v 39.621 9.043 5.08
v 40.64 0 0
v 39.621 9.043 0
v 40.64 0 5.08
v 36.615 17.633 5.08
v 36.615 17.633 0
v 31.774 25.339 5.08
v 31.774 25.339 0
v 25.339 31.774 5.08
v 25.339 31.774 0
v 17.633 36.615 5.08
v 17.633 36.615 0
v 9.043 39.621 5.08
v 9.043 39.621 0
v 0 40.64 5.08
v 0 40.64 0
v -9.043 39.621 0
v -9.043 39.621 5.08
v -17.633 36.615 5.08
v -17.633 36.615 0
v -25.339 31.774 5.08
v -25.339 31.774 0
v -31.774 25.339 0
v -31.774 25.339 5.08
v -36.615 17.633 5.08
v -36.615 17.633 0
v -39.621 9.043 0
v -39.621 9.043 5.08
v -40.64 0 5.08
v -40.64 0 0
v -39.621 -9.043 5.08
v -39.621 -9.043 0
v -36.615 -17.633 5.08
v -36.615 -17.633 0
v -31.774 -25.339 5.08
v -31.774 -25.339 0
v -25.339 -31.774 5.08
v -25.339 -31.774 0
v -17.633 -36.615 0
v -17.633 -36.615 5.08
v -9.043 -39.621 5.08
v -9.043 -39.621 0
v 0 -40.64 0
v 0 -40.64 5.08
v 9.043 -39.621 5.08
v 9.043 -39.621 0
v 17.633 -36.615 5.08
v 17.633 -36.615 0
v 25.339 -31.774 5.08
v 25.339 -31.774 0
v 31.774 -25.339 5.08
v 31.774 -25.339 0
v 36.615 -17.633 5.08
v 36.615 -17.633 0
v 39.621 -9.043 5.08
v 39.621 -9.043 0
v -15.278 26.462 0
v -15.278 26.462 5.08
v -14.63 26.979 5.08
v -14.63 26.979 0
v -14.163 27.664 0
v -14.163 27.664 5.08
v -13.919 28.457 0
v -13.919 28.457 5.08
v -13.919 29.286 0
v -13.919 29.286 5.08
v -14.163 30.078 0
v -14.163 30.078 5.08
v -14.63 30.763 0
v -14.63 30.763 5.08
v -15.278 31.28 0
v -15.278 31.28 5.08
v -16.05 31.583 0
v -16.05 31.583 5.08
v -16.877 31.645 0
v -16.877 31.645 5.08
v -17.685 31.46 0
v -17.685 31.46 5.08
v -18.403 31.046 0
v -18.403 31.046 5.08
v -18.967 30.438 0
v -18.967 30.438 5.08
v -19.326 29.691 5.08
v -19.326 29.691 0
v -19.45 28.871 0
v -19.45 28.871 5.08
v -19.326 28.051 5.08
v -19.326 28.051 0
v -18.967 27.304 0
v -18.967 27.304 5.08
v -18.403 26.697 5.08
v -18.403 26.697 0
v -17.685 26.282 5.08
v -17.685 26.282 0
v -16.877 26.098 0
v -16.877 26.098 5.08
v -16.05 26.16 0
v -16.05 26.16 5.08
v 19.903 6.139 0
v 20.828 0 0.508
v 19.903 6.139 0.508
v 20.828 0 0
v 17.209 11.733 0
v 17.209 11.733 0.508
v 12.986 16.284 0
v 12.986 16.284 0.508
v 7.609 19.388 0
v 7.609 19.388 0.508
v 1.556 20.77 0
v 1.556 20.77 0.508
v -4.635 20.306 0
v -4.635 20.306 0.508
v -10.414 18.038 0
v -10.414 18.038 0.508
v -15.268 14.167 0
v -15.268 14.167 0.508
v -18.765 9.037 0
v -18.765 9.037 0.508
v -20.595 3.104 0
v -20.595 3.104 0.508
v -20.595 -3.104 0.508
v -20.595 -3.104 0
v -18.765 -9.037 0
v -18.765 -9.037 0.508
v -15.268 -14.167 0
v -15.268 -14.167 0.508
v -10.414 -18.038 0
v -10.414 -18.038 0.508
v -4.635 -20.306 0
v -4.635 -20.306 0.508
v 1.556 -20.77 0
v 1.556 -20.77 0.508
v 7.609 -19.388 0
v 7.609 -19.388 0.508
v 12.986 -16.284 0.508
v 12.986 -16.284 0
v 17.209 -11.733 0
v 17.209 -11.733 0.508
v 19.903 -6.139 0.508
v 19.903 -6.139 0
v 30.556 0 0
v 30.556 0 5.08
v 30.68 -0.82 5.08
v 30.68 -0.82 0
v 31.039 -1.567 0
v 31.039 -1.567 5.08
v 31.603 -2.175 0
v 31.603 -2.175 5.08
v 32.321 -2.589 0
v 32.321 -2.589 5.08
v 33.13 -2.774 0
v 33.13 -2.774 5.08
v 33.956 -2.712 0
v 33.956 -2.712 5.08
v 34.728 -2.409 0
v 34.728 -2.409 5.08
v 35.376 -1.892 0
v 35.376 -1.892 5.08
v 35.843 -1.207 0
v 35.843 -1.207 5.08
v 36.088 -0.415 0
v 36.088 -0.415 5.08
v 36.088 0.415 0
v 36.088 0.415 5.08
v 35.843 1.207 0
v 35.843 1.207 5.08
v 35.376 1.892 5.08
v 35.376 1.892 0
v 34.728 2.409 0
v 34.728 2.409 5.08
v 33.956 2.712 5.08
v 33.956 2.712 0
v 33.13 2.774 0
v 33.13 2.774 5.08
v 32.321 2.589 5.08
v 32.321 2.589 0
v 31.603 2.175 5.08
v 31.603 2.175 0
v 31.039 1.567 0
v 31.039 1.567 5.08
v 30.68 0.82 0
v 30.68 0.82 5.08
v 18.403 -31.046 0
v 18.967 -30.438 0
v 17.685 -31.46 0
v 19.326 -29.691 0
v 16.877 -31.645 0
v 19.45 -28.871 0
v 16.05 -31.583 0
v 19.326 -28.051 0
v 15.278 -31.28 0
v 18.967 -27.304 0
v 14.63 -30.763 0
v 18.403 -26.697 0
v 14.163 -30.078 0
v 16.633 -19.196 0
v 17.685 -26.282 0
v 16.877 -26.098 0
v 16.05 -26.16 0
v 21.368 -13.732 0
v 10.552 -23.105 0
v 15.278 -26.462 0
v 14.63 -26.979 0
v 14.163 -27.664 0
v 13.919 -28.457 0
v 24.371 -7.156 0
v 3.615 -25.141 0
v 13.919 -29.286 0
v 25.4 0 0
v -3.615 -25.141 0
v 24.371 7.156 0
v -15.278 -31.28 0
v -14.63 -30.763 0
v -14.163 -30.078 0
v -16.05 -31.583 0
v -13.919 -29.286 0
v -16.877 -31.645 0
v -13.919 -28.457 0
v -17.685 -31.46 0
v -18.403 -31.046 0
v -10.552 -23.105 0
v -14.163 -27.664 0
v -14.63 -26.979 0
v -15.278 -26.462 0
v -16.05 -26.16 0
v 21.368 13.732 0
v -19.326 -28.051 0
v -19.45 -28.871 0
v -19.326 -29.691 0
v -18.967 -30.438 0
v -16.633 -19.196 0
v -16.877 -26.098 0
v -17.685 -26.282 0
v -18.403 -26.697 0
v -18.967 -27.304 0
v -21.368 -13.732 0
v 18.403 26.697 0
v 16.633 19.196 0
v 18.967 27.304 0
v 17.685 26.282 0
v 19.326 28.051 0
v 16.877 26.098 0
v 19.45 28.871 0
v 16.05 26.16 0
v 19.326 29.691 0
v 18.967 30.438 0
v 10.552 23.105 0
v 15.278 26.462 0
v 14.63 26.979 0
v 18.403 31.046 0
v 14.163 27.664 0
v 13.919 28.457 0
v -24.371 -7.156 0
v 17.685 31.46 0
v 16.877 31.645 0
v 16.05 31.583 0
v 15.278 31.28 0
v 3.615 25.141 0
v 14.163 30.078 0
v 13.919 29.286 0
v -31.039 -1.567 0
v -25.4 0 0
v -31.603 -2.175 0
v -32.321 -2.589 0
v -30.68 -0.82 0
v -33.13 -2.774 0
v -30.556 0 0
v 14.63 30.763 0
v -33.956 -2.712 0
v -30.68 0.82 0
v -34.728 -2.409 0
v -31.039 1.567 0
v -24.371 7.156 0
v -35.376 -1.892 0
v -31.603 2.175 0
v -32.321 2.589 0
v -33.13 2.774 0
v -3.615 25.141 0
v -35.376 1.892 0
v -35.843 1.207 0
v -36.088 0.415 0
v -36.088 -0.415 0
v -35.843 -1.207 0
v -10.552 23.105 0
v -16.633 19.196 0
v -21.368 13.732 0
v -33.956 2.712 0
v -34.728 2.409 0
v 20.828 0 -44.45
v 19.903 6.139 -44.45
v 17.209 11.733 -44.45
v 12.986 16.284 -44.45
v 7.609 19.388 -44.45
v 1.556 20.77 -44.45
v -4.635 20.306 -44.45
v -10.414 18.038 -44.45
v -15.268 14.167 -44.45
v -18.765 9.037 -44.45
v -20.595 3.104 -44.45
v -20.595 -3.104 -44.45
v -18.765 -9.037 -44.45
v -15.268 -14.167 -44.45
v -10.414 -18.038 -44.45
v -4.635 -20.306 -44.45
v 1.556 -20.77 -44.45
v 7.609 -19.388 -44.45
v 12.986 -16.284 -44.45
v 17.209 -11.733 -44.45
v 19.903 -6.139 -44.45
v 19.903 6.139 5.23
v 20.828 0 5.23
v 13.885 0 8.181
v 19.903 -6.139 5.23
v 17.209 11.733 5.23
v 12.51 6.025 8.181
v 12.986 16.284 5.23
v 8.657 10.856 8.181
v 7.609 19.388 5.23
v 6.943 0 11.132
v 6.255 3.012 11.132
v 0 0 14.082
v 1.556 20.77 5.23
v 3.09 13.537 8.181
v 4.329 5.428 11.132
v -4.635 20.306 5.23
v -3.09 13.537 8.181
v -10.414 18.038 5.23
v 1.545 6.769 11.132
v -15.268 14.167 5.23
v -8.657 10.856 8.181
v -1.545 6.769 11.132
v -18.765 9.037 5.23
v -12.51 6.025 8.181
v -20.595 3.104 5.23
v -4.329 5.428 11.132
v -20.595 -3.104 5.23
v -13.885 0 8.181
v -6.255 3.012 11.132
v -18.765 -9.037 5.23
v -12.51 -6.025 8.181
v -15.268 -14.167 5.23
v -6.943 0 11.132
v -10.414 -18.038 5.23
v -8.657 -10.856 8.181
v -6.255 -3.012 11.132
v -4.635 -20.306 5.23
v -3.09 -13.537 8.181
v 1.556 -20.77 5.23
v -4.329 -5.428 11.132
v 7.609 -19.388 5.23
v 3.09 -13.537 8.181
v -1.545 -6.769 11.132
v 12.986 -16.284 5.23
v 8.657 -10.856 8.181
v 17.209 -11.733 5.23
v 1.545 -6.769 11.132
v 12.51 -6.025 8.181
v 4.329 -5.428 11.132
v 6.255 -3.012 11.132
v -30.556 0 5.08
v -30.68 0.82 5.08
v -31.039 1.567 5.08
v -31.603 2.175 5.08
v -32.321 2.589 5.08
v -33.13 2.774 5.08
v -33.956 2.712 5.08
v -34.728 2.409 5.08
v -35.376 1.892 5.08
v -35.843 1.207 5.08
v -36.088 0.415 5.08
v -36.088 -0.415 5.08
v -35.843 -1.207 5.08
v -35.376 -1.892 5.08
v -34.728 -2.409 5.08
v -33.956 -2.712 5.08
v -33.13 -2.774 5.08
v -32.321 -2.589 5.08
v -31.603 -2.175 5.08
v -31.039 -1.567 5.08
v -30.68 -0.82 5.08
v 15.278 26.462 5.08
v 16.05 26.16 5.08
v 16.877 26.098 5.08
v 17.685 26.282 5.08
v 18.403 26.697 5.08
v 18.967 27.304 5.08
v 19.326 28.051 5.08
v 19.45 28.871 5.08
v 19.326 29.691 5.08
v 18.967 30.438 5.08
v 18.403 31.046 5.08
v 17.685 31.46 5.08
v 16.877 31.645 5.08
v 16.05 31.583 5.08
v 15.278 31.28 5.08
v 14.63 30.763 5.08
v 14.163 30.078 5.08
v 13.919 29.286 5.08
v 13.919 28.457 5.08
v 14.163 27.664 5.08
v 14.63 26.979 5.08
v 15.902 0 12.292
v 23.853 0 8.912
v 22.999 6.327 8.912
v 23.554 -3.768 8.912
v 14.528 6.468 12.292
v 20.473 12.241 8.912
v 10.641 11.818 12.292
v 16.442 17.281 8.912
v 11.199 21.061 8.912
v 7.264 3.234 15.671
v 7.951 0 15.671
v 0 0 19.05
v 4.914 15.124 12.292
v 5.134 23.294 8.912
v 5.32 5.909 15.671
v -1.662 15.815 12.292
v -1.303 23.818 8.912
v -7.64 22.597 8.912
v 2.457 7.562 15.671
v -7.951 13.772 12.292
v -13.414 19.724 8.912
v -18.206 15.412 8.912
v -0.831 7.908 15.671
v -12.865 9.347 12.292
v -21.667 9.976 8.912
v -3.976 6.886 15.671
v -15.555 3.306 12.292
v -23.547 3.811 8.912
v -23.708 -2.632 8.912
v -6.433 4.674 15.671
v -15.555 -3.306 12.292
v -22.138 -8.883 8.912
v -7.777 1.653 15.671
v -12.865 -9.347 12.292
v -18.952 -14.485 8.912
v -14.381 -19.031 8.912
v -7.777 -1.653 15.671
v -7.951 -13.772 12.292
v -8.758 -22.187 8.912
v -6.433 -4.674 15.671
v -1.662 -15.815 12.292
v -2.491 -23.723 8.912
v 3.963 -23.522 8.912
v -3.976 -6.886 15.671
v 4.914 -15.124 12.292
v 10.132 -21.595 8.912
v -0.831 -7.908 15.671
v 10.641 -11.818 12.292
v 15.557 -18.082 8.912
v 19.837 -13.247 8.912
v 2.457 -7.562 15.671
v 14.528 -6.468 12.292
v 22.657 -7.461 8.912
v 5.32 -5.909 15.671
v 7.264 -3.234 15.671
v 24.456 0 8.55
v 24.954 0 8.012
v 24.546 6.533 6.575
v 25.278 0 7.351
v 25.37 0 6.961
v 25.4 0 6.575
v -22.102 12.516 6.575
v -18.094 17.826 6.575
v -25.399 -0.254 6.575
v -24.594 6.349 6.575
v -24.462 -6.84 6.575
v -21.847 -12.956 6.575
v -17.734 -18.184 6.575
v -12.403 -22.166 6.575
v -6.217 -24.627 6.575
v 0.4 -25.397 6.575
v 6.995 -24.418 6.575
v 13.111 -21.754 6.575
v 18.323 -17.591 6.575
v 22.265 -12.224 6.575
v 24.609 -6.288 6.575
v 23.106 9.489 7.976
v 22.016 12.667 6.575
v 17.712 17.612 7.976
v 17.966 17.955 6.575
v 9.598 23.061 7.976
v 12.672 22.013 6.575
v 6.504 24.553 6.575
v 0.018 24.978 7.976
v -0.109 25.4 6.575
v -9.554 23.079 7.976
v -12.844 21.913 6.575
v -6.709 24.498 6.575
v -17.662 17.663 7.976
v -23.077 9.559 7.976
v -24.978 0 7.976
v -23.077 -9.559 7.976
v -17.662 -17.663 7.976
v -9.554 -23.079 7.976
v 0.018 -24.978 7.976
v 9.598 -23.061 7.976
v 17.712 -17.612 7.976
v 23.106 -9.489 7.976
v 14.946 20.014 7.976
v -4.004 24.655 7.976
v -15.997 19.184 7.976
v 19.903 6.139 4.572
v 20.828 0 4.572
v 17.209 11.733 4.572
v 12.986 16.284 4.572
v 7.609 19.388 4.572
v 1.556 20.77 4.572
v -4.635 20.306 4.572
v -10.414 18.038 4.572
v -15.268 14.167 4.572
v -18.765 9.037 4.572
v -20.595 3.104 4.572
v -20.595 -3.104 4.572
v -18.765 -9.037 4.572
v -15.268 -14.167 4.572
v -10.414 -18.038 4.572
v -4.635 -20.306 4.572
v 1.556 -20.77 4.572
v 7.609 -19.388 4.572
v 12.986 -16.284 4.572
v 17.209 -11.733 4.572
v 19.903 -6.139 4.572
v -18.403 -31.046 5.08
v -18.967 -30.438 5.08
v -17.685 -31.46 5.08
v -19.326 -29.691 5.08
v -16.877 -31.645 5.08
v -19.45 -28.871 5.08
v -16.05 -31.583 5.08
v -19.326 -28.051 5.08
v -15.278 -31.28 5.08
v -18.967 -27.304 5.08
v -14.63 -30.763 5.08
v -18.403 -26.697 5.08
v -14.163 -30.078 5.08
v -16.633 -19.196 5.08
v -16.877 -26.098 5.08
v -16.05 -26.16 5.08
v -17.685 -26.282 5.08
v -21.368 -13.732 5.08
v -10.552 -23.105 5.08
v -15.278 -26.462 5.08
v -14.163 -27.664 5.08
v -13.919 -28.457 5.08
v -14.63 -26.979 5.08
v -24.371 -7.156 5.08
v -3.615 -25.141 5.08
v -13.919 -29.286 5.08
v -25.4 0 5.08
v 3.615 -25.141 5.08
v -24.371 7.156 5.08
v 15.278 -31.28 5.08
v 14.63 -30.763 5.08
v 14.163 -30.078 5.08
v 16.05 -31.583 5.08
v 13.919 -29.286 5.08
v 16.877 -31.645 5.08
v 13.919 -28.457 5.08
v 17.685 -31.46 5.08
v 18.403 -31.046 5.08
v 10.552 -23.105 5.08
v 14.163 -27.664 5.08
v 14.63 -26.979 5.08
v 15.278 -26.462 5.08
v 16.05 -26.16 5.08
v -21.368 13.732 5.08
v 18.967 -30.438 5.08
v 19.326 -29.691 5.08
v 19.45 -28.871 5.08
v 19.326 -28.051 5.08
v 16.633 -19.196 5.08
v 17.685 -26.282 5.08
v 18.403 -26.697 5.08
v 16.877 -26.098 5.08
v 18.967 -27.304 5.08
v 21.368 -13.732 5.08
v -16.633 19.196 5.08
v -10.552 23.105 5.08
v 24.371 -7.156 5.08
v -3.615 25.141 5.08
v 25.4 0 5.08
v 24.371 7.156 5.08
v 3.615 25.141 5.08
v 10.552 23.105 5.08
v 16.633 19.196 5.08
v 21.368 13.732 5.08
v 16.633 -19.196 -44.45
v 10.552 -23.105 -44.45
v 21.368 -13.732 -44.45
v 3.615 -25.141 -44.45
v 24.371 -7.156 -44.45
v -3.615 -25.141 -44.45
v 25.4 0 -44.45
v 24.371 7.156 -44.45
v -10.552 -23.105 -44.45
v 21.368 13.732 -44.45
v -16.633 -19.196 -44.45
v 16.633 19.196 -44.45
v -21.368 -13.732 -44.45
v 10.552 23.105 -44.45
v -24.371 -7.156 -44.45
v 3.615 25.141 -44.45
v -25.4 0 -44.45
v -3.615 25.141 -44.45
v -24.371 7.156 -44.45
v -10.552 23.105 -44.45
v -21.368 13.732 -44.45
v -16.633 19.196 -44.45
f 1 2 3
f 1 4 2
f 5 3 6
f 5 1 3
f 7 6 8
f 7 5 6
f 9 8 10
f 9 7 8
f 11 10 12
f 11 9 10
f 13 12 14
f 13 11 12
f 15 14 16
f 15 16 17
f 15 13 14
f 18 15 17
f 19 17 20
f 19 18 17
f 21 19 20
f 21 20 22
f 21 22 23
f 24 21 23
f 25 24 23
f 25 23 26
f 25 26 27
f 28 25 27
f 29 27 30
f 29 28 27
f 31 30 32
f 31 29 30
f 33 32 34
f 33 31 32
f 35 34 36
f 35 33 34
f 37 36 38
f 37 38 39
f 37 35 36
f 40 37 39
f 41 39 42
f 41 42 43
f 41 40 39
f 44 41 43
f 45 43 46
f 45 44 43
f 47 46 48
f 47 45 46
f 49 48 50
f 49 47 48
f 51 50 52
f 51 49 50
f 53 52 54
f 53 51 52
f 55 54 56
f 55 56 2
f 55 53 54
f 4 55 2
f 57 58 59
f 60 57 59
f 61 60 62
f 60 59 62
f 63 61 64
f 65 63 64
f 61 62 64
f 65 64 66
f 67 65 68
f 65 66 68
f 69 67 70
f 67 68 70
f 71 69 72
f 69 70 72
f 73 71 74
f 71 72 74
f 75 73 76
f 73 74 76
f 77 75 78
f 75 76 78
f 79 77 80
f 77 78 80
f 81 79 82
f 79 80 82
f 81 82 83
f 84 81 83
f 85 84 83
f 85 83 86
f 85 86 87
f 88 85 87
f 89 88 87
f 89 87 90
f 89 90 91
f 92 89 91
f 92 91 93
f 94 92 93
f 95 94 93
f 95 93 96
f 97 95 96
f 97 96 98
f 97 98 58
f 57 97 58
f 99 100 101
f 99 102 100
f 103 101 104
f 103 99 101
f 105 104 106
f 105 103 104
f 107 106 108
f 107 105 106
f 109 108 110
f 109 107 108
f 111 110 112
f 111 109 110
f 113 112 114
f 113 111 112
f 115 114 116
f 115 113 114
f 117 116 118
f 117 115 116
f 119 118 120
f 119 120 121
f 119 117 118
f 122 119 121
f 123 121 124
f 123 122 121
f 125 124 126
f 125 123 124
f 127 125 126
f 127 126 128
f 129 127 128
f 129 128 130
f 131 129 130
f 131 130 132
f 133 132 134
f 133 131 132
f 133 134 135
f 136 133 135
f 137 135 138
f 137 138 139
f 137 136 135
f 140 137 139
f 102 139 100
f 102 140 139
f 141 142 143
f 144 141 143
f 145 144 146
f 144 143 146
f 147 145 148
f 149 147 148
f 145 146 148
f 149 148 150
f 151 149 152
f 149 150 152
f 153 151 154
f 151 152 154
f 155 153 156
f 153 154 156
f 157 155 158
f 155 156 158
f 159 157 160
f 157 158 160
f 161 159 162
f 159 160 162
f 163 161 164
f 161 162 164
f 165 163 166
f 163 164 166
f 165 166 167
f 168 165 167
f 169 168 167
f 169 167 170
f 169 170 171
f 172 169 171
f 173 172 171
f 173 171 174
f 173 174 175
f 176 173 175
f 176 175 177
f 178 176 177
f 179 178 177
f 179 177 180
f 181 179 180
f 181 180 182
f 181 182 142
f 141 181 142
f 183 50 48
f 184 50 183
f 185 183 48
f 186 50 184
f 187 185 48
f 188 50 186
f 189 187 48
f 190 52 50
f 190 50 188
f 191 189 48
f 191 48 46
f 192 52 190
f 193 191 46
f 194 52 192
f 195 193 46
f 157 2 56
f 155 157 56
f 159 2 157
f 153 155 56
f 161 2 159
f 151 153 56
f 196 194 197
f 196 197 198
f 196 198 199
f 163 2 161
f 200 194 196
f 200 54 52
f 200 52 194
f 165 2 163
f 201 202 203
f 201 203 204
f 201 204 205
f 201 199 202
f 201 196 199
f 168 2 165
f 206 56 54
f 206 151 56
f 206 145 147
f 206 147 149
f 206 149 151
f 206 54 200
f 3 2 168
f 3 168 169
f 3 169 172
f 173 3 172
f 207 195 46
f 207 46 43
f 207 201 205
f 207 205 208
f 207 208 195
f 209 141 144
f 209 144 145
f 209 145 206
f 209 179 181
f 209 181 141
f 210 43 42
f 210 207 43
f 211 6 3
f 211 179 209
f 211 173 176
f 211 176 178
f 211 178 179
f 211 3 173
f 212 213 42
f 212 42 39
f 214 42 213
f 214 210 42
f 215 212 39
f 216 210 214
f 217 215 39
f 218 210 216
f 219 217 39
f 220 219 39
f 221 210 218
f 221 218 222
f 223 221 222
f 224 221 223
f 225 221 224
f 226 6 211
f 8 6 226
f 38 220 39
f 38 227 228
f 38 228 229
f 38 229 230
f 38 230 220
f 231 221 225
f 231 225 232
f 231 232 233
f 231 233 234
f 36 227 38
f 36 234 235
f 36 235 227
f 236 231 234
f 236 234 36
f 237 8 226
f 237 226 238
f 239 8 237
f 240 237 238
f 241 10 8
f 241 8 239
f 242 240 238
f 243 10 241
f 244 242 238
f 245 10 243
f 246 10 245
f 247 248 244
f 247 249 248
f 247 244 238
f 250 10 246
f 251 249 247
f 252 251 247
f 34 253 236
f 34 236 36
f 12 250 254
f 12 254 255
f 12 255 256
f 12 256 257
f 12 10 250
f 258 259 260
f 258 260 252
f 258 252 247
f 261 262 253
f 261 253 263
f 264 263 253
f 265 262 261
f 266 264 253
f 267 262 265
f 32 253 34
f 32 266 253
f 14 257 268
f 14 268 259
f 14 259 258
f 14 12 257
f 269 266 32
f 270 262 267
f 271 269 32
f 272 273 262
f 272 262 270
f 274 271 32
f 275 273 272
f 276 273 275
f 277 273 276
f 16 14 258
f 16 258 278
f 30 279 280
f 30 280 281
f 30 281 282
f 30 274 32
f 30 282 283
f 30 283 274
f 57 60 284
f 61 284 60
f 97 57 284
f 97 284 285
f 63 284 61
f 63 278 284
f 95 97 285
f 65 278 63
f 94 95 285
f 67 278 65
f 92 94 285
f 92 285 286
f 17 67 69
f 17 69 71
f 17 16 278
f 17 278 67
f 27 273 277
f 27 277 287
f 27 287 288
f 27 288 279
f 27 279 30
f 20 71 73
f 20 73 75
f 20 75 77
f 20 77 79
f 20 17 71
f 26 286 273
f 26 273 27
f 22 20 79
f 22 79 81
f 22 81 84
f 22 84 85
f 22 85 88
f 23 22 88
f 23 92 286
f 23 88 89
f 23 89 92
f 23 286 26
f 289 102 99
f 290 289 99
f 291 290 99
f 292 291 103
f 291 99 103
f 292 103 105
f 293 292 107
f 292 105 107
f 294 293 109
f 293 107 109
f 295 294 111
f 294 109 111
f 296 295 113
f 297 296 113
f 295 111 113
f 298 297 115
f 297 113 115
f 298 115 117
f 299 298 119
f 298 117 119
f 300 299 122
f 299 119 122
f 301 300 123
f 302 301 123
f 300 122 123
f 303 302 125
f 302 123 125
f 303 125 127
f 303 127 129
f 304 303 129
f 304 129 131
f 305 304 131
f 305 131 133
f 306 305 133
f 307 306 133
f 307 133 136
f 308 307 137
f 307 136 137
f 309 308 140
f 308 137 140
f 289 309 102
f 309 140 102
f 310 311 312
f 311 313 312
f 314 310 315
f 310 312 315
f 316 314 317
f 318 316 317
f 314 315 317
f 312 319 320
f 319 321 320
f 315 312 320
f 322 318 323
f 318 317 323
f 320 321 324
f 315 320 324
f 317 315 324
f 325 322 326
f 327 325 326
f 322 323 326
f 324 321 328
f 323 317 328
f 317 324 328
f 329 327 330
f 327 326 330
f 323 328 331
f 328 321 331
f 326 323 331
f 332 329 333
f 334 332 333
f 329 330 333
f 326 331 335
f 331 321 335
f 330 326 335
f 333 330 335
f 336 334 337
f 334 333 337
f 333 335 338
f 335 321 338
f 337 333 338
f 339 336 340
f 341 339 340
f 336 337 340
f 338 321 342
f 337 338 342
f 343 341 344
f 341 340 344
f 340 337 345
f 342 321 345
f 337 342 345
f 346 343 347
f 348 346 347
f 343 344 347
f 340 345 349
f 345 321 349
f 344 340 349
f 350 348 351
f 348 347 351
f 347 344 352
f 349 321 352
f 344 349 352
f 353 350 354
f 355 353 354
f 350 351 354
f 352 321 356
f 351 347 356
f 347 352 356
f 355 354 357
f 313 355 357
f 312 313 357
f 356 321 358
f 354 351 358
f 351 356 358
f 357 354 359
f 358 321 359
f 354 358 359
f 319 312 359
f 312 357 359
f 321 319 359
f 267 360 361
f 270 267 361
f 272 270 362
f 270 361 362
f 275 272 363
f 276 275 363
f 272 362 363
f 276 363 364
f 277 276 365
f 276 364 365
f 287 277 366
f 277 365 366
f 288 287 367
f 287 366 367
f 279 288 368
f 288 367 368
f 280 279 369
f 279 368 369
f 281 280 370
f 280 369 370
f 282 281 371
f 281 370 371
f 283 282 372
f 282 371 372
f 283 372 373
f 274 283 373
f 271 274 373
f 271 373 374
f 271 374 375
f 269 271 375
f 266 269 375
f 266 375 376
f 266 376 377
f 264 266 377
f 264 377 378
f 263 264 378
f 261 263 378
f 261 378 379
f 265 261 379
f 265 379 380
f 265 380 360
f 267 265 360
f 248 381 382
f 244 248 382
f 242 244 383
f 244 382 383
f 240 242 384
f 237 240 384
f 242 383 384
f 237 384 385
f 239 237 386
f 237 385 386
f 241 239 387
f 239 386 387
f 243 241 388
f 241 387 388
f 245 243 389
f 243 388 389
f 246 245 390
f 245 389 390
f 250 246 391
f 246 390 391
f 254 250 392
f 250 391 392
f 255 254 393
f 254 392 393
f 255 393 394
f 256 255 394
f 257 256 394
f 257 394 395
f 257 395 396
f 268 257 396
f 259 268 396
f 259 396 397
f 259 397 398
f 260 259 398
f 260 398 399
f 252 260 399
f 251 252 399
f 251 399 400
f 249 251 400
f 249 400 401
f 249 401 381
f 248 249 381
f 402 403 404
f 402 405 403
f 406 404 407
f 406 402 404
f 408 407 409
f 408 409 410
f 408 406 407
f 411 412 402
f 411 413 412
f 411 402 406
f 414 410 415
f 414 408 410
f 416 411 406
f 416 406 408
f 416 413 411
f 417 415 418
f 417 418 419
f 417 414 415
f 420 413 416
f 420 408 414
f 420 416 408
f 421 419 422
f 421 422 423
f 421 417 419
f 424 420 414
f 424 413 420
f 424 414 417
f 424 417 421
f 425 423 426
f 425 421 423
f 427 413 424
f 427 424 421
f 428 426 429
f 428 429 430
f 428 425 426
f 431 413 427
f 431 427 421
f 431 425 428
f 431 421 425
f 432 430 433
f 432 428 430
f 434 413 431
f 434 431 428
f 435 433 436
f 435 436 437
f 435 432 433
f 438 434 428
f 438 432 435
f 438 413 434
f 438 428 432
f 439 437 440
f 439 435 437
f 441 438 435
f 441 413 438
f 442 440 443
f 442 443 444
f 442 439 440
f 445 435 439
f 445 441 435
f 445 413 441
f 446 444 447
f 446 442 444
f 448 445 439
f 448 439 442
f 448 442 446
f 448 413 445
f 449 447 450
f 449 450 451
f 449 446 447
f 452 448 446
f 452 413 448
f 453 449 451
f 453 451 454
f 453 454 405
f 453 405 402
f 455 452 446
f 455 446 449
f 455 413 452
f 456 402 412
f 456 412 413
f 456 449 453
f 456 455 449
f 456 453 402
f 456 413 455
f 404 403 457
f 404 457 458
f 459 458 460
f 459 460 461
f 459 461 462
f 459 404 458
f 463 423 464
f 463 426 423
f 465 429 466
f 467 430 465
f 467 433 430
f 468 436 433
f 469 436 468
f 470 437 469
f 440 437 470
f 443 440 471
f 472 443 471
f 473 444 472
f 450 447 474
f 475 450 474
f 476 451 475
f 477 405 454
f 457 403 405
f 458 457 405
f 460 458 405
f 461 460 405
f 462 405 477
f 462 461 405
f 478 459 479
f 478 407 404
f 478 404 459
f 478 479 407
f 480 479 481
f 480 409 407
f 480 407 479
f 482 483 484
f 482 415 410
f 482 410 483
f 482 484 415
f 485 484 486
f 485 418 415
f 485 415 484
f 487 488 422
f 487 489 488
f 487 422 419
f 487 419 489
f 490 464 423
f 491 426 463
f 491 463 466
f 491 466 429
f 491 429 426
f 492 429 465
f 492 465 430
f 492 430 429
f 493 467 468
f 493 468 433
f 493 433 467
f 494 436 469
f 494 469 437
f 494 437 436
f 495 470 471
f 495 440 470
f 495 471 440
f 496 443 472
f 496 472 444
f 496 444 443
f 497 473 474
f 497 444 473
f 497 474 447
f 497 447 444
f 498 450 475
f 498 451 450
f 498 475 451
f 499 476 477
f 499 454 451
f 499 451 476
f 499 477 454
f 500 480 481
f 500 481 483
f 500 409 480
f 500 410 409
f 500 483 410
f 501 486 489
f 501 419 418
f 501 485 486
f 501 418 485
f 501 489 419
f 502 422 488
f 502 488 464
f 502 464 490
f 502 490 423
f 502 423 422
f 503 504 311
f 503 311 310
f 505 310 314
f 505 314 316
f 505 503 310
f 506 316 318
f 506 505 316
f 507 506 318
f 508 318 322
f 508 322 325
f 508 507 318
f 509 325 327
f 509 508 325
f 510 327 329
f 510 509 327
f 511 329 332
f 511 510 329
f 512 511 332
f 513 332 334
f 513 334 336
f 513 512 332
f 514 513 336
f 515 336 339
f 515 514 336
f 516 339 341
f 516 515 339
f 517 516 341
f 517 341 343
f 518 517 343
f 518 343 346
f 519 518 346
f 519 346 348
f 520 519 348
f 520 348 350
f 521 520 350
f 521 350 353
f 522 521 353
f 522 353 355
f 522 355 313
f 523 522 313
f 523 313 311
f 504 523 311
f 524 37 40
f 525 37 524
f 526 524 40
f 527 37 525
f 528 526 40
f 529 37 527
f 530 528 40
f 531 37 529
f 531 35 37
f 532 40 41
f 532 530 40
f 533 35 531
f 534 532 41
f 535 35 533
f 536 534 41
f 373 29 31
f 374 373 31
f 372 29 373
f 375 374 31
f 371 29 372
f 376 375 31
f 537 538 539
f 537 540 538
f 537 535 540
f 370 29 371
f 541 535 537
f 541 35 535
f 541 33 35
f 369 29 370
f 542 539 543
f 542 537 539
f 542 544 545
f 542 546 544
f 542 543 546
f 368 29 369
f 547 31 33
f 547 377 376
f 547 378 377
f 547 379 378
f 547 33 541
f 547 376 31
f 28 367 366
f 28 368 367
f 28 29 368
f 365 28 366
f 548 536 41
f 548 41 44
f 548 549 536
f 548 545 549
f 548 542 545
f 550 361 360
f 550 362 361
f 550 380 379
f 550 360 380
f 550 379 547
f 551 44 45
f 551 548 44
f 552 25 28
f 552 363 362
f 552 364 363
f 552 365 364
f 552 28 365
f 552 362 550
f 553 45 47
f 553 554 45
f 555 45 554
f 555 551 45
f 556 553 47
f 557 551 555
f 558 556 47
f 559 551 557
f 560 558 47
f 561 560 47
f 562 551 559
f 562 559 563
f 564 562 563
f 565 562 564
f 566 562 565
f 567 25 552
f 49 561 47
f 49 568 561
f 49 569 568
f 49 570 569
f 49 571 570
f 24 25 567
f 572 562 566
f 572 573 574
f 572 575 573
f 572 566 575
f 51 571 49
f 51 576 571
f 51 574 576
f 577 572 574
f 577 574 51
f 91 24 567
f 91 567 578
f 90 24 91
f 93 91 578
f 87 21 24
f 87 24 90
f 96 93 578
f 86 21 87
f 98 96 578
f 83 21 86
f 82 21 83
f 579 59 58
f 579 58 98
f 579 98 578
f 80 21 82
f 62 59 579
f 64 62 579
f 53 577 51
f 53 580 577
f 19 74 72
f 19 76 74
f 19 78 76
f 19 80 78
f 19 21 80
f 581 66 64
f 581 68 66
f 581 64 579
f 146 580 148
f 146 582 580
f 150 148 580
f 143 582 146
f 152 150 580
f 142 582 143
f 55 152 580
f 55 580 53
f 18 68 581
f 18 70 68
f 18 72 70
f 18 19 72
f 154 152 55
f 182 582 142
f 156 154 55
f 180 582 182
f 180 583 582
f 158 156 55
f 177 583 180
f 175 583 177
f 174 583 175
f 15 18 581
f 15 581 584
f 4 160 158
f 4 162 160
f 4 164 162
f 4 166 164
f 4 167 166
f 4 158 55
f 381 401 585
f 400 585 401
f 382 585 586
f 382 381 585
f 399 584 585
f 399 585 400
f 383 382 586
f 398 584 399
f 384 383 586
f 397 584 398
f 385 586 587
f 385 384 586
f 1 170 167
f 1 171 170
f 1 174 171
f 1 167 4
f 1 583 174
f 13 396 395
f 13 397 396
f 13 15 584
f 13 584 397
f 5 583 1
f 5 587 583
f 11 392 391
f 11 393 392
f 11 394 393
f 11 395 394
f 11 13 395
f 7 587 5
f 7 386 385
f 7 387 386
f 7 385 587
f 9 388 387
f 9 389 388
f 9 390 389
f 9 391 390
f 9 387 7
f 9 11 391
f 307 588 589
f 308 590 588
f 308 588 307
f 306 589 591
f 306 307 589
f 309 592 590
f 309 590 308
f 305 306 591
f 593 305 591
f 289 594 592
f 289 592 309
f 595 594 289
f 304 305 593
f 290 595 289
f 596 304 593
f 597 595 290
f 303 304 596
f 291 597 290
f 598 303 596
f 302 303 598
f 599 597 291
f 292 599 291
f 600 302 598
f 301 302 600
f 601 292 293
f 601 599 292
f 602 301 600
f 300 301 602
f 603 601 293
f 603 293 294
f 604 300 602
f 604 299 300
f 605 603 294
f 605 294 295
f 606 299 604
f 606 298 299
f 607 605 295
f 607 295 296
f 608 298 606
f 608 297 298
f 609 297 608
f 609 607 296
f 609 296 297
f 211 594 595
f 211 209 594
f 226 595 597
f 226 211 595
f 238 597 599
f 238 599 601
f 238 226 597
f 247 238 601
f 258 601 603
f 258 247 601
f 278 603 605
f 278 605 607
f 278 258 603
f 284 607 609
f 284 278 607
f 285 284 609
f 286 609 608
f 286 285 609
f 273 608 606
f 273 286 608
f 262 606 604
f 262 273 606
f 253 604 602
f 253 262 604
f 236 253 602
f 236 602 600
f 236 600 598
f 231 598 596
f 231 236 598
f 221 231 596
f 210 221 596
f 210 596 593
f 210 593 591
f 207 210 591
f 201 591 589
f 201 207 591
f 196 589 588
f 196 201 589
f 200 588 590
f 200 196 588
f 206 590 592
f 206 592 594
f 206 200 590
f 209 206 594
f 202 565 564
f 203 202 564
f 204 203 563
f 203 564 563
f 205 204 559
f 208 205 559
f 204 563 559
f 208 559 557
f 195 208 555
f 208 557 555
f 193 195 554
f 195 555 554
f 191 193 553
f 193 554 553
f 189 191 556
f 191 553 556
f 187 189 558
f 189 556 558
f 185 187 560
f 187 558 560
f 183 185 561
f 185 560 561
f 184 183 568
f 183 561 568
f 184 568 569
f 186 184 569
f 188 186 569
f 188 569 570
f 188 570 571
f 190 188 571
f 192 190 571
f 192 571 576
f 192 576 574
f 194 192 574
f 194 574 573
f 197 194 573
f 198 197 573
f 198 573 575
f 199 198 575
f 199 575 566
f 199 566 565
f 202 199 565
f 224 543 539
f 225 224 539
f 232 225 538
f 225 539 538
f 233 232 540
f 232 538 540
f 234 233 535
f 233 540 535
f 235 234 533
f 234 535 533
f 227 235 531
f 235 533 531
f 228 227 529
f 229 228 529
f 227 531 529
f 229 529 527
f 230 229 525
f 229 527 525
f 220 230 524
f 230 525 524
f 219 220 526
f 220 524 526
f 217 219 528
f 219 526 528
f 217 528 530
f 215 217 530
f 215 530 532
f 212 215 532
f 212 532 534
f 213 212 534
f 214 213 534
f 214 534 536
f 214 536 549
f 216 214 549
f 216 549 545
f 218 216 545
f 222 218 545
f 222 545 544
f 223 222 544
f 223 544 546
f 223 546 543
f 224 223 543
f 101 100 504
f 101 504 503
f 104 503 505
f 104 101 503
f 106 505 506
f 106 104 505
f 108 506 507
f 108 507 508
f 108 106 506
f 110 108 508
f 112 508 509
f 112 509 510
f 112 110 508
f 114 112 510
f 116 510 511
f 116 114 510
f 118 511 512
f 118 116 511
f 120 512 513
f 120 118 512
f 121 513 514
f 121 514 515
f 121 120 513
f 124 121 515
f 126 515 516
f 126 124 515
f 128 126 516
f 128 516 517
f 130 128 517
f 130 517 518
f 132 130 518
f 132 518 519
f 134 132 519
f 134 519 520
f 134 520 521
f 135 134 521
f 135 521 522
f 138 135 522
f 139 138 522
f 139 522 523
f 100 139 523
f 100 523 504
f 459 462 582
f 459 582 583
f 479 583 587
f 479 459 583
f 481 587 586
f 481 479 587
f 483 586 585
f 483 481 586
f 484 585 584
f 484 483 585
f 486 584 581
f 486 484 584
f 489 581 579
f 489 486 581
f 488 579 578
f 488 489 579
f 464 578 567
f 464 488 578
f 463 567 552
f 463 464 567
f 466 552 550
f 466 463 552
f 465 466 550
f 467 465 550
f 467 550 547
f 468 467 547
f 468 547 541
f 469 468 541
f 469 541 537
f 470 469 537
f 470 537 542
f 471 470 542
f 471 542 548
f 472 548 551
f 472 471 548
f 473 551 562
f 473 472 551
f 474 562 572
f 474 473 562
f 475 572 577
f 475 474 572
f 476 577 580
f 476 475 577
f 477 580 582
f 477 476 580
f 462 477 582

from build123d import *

# Parameters (mm, degrees)
F3_D            = 5.5626
F3_COPIES_COUNT = 6
F4_R            = 2.54
F5_T            = 4.572


# Not quite as in the source:
# - a pattern or mirror of a feature is missing from the dataset's text; its kind, count and spacing are read off the source's solid
# - a shell that OpenCascade refuses in one call is made with other operations: the cavity is built on its own and cut out


with BuildPart() as f2:
    # F1 (on Front) → F2 (revolve)
    with BuildSketch(Plane.XZ):
        Polygon((25.4, 8.255), (0, 19.05), (0, -44.45), (25.4, -44.45), (25.4, 0), (40.64, 0), (40.64, 5.08), (25.4, 5.08), align=None)
    revolve(axis=Axis((0, 0, -12.7), (0, 0, 1)))

    # F3 (through all)
    with Locations(Plane(origin=(0, 0, 0), x_dir=(1, 0, 0), z_dir=(0, 0, -1))):
        with Locations((33.3375, 0)):
            f3 = Hole(F3_D / 2)

    # F3_copies: F3 ×6 about axis
    f3_copies_axis = Axis((0, 0, 0), (0, 0, 1))
    for i in range(1, F3_COPIES_COUNT):
        add(f3.rotate(f3_copies_axis, i * 360 / F3_COPIES_COUNT), mode=Mode.SUBTRACT)

    # F4
    f4_edges = [f2.edges().sort_by_distance(p)[0] for p in [
        (-25.4, 0, 8.255),
    ]]
    fillet(f4_edges, radius=F4_R)

    # F5: shell of thickness 4.572, made by hand


with BuildPart() as f5_core1:
    # F5_t2: copy of F2
    add(f2.part)

    # the walls: a layer under each face that stays
    f5_faces = [f5_core1.faces().sort_by_distance(p)[0] for p in [
        (-25.4, 0, 5.8273115729),
        (-24.9783818064, 0, 7.9760718686),
        (-27.0933333333, -27.0933333333, 5.08),
        (-11.9267486132, 0, 13.9811318394),
        (-40.64, 0, 2.54),
        (-15.2781, -26.4624454431, 2.54),
        (15.2781, -26.4624454431, 2.54),
        (30.5562, 0, 2.54),
        (-30.5562, 0, 2.54),
        (-15.2781, 26.4624454431, 2.54),
        (15.2781, 26.4624454431, 2.54),
        (27.0933333333, -27.0933333333, 0),
        (-25.4, 0, -22.225),
    ]]
    thicken(f5_faces, amount=-F5_T, mode=Mode.SUBTRACT)

    # F5_s3 → F5_t4 (revolve, cut)
    with BuildSketch(Plane.XZ):
        Polygon((25.44572, 5.12572), (20.828, 5.08), (20.828, 0.508), (25.4, 0.508), align=None)
    revolve(axis=Axis((0, 0, 5.08), (0, 0, 1)), mode=Mode.SUBTRACT)

    # F5_s5 → F5_t6 (revolve, cut)
    with BuildSketch(Plane.XZ):
        Polygon((25.44572, -0.04572), (25.4, 4.572), (20.828, 4.572), (20.828, 0), align=None)
    revolve(axis=Axis((0, 0, 0), (0, 0, 1)), mode=Mode.SUBTRACT)


with BuildPart() as f2_1:
    add(f2.part)

    # what is left inside the walls is the cavity
    f5_cavity = [f5_core1.part.solids().sort_by_distance(p)[0] for p in [
        (-20.78228, 0, -29.633333),
    ]]
    add(f5_cavity, mode=Mode.SUBTRACT)


solid = f2_1.part
